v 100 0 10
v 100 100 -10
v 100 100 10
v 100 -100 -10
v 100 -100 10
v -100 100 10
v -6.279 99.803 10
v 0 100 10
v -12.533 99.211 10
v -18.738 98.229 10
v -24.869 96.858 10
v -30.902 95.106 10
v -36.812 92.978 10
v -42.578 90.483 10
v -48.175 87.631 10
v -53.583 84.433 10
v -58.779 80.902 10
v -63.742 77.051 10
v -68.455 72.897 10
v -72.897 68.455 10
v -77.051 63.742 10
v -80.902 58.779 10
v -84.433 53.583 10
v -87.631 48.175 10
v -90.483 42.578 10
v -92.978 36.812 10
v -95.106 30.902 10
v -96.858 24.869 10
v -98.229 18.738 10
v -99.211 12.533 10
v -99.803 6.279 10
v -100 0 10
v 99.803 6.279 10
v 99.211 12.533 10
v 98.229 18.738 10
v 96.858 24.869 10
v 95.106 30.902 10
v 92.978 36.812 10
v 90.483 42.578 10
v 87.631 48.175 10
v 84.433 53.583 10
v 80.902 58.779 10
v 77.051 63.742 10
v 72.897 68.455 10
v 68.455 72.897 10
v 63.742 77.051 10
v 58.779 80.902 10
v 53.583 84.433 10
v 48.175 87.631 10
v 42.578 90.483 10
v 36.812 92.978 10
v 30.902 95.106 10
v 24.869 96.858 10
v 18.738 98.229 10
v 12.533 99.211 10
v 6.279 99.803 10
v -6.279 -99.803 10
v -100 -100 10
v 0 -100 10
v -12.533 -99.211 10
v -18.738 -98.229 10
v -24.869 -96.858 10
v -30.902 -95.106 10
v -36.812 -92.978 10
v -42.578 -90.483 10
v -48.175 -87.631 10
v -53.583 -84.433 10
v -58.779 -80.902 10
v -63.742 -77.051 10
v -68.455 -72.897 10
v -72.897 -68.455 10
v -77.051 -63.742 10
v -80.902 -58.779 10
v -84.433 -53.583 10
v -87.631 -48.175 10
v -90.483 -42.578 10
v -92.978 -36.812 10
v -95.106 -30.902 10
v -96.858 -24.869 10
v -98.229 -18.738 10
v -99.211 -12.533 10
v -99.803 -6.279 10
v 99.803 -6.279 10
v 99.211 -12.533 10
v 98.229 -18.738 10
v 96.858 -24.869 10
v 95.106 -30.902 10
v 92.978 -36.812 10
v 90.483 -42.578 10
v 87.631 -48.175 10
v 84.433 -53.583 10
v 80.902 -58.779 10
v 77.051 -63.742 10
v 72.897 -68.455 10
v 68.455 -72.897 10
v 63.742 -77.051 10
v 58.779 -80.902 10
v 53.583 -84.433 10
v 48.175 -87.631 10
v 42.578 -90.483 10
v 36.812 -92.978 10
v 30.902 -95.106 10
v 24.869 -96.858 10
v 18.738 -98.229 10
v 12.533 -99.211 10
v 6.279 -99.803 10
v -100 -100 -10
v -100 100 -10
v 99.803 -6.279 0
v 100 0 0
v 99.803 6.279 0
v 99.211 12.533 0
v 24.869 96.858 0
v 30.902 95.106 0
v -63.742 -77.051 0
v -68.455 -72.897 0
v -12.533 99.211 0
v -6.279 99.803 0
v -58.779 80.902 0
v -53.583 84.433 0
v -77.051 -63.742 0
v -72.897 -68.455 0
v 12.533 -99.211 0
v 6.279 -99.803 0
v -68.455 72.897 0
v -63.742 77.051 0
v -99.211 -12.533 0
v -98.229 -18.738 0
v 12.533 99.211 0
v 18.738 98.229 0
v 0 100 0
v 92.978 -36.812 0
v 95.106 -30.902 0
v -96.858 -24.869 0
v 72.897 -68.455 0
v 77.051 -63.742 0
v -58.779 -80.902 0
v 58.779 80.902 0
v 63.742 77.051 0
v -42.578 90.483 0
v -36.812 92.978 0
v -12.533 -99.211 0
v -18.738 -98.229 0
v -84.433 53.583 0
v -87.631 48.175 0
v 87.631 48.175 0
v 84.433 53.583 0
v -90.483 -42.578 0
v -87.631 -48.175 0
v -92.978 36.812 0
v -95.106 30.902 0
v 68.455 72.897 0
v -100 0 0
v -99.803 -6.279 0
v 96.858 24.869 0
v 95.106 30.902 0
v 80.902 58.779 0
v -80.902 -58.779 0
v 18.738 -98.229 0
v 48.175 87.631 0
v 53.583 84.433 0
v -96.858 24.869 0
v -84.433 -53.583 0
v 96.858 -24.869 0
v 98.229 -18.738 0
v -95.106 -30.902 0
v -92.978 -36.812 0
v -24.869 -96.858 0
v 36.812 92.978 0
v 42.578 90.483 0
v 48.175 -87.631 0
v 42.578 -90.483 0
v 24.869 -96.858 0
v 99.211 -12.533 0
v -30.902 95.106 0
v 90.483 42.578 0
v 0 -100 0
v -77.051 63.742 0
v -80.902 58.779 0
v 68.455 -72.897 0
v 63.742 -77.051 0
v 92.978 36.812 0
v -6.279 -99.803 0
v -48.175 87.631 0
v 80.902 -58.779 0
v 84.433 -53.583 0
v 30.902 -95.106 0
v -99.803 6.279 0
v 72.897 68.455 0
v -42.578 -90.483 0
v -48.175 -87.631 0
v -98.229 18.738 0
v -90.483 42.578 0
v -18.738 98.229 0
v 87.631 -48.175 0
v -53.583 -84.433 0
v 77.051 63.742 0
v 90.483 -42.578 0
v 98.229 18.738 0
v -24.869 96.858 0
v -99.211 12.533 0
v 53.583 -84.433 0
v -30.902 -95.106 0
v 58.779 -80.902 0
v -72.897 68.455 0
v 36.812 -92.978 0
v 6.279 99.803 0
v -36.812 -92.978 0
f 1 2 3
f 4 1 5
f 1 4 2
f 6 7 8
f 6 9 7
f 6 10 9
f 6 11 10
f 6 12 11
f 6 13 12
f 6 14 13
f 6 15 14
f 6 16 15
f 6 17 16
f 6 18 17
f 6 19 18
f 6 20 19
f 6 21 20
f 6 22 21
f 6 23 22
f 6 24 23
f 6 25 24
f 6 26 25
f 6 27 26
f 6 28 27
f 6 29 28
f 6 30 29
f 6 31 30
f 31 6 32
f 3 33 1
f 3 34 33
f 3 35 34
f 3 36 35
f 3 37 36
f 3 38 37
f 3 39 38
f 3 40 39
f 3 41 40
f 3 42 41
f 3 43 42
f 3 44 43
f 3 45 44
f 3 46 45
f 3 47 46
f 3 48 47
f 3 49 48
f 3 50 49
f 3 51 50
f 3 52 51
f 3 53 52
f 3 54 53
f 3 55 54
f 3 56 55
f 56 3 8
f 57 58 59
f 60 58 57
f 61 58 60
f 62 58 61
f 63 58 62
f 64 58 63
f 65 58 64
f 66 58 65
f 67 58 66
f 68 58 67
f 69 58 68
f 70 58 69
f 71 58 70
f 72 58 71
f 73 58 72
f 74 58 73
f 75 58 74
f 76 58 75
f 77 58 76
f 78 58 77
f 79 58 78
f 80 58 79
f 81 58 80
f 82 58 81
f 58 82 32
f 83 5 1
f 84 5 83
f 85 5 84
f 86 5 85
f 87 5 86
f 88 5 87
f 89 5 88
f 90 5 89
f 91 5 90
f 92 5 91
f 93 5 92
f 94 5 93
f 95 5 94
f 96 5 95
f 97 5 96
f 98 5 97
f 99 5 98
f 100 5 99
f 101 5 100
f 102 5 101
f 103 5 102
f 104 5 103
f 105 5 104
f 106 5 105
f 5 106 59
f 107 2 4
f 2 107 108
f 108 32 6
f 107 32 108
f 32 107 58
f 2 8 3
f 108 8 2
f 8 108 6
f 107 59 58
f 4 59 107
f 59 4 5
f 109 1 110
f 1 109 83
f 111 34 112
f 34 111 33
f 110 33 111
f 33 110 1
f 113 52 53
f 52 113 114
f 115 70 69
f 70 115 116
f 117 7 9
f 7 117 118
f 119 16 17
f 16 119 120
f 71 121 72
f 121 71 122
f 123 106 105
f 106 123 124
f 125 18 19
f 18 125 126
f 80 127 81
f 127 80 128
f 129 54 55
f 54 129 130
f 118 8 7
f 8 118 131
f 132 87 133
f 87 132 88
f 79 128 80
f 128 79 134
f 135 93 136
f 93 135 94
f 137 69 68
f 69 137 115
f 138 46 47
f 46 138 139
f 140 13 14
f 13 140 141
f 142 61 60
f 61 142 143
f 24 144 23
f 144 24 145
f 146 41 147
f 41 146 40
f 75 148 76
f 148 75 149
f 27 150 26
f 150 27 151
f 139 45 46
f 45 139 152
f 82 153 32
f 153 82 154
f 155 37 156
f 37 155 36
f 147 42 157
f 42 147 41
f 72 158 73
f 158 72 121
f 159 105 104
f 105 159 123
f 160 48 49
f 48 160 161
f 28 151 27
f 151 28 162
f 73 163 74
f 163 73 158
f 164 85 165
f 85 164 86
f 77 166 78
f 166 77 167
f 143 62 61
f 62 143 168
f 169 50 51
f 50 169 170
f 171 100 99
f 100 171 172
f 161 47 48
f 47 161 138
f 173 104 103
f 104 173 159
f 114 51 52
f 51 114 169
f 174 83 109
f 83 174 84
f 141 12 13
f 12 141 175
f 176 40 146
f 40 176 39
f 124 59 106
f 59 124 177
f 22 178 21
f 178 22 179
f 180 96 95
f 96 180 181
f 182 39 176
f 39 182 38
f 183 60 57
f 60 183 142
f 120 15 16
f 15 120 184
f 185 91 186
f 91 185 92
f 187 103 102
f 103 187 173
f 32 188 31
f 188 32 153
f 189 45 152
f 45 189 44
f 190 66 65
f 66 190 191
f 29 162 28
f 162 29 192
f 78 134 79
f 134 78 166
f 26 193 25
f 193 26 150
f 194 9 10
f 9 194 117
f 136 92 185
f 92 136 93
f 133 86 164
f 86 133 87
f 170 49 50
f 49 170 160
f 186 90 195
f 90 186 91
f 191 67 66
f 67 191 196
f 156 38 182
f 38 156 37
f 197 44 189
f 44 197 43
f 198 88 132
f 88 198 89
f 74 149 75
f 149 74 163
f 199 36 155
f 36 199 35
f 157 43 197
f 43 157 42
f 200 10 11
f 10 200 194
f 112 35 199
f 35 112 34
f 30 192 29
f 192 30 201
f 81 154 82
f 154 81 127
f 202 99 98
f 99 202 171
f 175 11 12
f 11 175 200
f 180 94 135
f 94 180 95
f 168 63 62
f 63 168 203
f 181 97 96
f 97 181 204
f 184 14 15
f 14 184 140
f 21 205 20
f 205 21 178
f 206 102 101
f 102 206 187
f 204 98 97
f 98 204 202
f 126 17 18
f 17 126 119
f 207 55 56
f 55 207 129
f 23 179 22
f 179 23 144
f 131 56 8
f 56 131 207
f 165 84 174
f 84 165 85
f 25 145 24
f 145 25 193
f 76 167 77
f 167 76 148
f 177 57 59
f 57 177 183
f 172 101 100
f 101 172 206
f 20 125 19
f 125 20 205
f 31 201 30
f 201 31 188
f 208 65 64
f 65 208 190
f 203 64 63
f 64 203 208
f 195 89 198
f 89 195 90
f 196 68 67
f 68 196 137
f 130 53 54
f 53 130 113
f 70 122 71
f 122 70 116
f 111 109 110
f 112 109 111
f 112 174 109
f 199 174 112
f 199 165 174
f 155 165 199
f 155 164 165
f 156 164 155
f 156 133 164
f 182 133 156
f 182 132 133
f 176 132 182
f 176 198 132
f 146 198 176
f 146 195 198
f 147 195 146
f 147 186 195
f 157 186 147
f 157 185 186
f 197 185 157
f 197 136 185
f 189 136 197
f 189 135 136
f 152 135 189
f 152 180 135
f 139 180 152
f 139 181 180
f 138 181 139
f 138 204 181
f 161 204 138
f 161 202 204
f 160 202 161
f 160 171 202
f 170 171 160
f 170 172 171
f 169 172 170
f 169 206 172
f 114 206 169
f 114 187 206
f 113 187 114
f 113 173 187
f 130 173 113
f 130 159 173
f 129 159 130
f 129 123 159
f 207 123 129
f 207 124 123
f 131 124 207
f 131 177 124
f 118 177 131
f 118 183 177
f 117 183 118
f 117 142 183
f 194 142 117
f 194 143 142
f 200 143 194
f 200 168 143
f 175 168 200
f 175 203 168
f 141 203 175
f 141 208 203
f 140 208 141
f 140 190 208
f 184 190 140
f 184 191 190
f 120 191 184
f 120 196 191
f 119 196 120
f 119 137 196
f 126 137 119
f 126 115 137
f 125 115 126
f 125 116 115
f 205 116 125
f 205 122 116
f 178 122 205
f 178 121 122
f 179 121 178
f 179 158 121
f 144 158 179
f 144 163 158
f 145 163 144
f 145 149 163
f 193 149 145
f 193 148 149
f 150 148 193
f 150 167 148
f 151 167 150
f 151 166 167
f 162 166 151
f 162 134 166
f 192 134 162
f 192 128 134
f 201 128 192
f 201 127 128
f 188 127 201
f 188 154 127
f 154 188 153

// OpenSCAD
difference(){cube(size=[200.0000,200.0000,20.0000],center=true);cylinder(h=100.0000,d=200.0000,$fn=100);}
